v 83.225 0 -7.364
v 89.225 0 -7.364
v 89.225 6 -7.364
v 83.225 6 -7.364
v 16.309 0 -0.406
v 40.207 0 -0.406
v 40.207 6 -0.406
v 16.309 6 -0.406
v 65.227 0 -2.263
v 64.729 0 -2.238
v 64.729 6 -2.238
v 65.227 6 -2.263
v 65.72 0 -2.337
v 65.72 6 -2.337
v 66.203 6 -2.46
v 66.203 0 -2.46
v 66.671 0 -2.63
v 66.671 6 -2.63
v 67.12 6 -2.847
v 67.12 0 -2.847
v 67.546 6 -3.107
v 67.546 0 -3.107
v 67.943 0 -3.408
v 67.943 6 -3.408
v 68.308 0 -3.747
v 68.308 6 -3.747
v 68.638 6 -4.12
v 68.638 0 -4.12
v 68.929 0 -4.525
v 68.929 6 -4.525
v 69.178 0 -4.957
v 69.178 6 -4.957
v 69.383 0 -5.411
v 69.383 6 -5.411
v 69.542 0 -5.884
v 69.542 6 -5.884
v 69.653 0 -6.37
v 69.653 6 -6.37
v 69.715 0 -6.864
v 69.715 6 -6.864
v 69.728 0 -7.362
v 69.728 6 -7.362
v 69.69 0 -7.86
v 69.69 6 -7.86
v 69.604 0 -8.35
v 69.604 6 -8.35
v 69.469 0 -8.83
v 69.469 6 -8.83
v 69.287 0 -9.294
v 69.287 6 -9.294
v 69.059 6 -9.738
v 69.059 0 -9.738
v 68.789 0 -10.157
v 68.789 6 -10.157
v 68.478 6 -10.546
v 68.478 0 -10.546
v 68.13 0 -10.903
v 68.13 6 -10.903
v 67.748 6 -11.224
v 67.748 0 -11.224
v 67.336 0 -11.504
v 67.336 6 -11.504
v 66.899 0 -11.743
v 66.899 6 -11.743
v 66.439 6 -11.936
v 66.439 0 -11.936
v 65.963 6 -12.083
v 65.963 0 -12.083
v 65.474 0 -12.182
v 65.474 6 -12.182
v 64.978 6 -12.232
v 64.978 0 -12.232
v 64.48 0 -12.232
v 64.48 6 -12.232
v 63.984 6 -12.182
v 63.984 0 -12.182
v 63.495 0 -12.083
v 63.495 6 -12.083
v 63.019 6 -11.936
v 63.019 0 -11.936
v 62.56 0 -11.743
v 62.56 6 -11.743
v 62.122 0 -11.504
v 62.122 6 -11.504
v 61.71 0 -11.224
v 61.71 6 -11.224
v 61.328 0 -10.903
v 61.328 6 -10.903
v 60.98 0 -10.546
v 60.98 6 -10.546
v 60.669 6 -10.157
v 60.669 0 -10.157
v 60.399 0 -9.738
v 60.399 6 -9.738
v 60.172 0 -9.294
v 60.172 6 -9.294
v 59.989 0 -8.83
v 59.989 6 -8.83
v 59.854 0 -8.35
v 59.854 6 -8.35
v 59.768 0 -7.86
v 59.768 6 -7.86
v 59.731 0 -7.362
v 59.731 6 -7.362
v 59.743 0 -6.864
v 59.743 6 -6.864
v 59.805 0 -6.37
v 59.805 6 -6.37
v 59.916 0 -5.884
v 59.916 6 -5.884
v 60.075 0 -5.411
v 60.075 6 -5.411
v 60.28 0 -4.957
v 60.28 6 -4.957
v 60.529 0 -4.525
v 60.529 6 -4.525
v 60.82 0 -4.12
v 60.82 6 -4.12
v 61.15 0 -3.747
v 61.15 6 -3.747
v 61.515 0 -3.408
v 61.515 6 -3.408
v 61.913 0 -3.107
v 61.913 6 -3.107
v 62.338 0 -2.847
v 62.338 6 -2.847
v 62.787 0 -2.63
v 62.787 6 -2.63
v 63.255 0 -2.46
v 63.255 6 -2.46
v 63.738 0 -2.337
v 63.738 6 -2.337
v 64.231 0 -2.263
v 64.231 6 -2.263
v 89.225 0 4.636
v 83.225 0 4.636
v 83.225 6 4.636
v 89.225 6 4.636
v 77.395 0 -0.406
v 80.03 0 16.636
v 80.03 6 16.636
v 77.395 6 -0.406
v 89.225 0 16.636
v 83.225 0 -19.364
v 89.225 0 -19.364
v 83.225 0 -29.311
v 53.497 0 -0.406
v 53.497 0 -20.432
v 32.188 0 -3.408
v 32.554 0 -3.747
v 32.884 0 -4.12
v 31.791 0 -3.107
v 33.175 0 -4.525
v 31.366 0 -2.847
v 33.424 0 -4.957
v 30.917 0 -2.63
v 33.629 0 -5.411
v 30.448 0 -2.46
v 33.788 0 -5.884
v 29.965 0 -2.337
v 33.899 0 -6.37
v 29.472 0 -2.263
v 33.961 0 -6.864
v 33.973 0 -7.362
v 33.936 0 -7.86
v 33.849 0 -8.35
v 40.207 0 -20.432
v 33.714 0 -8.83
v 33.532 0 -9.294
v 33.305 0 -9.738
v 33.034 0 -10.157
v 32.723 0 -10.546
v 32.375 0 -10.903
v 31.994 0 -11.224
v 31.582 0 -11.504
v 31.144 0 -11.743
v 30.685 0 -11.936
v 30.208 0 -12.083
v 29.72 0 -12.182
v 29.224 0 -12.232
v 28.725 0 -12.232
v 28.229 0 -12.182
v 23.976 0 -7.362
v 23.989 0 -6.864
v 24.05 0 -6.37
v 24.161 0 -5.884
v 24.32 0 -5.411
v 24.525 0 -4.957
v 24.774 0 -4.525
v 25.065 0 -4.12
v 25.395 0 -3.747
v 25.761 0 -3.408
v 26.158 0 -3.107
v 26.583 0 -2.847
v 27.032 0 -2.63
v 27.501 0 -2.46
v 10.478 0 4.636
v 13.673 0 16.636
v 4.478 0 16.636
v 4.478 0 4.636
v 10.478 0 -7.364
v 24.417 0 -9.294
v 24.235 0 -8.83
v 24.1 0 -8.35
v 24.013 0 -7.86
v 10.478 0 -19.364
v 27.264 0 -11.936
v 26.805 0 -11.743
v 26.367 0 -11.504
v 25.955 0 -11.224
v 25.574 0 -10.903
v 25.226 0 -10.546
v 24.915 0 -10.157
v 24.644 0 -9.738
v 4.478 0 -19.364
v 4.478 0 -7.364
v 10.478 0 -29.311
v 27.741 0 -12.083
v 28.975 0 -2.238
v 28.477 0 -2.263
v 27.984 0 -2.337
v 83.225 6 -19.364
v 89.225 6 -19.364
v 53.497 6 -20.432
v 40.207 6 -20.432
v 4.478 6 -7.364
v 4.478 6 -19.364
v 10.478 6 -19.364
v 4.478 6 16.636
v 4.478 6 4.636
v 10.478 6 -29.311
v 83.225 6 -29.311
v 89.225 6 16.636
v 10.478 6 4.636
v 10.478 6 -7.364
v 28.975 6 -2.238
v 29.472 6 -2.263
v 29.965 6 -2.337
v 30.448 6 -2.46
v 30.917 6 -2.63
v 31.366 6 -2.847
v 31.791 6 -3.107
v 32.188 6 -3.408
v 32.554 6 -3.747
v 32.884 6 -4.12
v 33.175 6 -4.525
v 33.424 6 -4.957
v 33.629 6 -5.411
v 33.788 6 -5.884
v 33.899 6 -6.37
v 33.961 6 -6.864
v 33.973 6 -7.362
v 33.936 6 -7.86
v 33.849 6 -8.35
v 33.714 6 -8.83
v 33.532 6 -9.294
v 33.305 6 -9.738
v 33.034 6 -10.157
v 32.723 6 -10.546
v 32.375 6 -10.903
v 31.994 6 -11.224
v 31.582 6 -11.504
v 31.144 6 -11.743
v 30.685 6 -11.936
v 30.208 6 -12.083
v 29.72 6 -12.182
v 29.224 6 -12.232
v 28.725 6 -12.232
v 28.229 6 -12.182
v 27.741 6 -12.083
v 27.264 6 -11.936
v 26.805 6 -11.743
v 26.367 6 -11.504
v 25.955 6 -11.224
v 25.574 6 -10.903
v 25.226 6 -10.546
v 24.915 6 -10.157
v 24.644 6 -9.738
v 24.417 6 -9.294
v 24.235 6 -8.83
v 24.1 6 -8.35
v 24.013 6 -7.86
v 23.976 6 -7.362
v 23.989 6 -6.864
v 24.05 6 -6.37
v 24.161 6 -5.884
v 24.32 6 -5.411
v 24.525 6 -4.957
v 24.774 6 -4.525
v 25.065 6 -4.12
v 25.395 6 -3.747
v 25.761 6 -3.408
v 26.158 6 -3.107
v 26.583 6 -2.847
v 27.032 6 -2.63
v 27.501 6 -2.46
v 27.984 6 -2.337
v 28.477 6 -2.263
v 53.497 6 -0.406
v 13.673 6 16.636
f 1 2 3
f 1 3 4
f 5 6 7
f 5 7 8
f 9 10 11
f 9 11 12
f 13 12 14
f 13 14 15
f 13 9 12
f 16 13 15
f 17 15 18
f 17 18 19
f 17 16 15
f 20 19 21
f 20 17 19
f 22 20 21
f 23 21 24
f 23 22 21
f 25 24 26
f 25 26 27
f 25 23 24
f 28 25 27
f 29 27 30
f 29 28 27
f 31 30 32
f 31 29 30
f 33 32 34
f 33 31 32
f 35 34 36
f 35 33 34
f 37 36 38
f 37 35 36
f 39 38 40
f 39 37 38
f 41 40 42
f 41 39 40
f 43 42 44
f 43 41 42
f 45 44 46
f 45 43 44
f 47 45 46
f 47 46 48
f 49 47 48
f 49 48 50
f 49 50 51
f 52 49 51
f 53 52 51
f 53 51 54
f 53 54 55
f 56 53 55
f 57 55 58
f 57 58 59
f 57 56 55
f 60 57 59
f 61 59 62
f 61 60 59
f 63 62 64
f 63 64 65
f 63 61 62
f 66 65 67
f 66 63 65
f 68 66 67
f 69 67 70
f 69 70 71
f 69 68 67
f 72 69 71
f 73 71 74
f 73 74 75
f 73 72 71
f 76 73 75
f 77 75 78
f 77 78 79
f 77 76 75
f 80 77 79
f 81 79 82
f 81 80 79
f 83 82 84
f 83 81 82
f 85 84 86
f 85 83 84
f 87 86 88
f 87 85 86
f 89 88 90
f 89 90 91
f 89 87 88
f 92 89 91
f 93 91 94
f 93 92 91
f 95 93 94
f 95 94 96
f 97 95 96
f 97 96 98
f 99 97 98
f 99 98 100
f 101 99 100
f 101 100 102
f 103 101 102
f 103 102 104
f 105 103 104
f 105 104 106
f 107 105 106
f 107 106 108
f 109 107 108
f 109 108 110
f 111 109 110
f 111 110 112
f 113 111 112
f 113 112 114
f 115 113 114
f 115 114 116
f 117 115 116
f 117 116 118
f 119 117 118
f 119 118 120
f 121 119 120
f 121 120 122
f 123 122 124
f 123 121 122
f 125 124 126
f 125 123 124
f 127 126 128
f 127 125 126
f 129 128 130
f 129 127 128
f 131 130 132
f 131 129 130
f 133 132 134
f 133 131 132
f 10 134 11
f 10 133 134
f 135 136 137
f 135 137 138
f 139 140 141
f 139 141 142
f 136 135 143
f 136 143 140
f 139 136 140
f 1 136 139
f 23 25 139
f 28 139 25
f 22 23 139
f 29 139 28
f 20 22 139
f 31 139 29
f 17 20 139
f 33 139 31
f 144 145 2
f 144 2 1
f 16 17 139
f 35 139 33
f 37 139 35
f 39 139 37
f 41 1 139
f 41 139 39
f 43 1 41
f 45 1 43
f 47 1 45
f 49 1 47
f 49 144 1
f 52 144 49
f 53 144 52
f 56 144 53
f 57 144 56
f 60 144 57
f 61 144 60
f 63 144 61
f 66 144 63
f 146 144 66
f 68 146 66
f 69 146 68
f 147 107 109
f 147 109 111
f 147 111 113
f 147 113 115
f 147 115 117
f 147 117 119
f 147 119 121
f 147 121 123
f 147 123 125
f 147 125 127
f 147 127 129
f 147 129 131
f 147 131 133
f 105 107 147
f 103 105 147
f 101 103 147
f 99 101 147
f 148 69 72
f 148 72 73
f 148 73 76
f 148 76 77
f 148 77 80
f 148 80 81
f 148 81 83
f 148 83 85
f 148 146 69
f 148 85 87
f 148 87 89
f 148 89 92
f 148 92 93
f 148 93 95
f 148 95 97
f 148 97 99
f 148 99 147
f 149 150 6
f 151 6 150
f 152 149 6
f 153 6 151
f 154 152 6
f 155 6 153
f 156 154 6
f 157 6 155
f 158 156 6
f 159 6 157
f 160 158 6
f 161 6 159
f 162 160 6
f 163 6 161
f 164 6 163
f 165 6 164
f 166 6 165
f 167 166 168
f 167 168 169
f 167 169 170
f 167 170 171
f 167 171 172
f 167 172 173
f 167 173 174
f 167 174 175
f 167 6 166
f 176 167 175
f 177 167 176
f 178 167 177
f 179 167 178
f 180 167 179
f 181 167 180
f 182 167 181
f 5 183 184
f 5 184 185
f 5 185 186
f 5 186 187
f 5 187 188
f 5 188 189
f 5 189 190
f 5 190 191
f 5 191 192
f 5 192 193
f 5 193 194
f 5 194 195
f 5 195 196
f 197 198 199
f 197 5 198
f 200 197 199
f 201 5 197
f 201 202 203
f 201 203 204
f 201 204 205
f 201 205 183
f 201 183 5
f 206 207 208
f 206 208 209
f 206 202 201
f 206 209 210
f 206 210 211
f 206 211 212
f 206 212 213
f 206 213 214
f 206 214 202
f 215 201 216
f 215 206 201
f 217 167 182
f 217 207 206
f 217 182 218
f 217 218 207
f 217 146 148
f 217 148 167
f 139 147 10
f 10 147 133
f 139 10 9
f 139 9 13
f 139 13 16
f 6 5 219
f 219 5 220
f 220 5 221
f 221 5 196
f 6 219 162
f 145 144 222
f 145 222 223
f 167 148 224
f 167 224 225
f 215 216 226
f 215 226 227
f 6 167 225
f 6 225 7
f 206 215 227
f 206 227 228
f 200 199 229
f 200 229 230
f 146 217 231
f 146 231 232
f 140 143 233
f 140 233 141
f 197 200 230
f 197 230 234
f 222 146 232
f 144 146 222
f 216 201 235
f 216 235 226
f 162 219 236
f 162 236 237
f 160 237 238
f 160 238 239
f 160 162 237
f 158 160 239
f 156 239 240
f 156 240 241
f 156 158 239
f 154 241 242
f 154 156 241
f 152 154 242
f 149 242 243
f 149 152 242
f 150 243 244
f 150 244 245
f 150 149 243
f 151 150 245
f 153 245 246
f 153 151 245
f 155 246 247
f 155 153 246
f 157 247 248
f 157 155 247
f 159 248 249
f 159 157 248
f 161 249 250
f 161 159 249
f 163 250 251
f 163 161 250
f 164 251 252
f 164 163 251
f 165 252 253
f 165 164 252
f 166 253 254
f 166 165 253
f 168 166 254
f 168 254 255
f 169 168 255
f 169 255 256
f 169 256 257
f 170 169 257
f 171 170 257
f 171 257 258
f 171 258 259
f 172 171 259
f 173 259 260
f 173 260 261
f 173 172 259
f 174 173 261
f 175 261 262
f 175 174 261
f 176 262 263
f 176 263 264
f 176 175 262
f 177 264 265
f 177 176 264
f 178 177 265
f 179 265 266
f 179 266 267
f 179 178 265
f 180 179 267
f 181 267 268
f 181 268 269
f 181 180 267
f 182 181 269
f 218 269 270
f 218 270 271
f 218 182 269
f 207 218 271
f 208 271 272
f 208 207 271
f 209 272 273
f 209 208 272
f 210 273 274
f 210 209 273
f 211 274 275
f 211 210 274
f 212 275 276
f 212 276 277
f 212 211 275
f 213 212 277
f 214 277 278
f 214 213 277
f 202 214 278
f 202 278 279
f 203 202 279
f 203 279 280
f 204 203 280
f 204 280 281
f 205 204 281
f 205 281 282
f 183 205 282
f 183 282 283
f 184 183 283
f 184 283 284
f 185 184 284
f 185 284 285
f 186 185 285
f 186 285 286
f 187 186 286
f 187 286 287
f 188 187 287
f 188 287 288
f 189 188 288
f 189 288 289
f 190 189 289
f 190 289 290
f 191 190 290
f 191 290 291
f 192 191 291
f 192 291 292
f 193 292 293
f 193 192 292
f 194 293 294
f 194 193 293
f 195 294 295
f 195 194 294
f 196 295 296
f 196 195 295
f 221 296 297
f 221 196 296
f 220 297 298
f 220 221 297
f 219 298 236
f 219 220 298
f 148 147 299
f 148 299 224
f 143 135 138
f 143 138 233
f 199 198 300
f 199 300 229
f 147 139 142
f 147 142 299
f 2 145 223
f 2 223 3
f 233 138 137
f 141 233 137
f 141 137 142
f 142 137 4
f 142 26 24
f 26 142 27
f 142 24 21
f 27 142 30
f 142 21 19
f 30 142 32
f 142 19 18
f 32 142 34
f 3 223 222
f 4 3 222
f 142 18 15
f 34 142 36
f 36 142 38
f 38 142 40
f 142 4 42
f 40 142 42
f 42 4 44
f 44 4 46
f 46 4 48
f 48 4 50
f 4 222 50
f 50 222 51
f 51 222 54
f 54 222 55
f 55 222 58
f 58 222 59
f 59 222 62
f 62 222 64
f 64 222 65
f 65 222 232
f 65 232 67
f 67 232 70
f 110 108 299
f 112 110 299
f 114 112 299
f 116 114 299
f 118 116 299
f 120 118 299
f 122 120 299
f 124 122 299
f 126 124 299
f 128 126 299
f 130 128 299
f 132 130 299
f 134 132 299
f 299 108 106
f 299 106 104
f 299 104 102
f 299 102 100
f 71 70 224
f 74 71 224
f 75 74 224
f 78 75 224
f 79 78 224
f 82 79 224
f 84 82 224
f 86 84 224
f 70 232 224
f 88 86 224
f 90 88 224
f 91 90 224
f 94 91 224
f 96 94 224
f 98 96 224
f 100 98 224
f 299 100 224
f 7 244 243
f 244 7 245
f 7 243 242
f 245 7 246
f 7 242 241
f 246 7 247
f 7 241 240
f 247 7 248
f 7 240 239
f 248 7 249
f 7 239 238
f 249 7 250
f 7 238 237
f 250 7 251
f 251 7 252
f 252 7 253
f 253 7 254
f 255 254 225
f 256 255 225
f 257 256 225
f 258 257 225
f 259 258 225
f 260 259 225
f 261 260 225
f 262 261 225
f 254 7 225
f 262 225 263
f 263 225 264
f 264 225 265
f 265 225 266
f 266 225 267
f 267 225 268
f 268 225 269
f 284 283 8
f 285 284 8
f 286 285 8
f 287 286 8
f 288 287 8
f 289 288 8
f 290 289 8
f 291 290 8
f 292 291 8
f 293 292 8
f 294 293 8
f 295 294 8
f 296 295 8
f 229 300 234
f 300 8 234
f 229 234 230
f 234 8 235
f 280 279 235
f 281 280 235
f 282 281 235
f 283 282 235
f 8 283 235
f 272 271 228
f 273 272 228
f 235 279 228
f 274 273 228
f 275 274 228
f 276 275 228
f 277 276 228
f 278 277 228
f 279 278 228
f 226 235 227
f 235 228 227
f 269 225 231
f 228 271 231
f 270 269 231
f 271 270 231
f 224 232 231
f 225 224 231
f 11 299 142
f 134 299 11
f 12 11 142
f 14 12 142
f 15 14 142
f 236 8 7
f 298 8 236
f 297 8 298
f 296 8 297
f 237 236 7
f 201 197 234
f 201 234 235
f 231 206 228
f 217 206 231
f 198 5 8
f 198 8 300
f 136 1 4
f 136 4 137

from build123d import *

# Parameters (mm, degrees)
SKETCH1_R           = 5
BOSS_EXTRUDE1_DEPTH = 6


with BuildPart() as part:
    # Sketch1 → Boss-Extrude1 (new body)
    with BuildSketch(Plane(origin=(0, 0, 0), x_dir=(1, 0, 0), z_dir=(0, 1, 0))):
        Polygon((13.673278968, -16.635546923), (4.478237082, -16.635546923), (4.478237082, -4.635546923), (10.478237082, -4.635546923), (10.478237082, 7.364453077), (4.478237082, 7.364453077), (4.478237082, 19.364453077), (10.478237082, 19.364453077), (10.478237082, 29.311113477), (83.225400432, 29.311113477), (83.225400432, 19.364453077), (89.225400432, 19.364453077), (89.225400432, 7.364453077), (83.225400432, 7.364453077), (83.225400432, -4.635546923), (89.225400432, -4.635546923), (89.225400432, -16.635546923), (80.030358547, -16.635546923), (77.395115136, 0.405693798), (53.496778433, 0.405693798), (53.496778433, 20.432362651), (40.206859082, 20.432362651), (40.206859082, 0.405693798), (16.308522379, 0.405693798), align=None)
        with Locations(Location((28.974519722, 7.237839647, 0), (0, 0, 270))):
            Circle(SKETCH1_R, mode=Mode.SUBTRACT)
        with Locations(Location((64.729117792, 7.237839647, 0), (0, 0, 270))):
            Circle(SKETCH1_R, mode=Mode.SUBTRACT)
    extrude(amount=BOSS_EXTRUDE1_DEPTH)


solid = part.part
